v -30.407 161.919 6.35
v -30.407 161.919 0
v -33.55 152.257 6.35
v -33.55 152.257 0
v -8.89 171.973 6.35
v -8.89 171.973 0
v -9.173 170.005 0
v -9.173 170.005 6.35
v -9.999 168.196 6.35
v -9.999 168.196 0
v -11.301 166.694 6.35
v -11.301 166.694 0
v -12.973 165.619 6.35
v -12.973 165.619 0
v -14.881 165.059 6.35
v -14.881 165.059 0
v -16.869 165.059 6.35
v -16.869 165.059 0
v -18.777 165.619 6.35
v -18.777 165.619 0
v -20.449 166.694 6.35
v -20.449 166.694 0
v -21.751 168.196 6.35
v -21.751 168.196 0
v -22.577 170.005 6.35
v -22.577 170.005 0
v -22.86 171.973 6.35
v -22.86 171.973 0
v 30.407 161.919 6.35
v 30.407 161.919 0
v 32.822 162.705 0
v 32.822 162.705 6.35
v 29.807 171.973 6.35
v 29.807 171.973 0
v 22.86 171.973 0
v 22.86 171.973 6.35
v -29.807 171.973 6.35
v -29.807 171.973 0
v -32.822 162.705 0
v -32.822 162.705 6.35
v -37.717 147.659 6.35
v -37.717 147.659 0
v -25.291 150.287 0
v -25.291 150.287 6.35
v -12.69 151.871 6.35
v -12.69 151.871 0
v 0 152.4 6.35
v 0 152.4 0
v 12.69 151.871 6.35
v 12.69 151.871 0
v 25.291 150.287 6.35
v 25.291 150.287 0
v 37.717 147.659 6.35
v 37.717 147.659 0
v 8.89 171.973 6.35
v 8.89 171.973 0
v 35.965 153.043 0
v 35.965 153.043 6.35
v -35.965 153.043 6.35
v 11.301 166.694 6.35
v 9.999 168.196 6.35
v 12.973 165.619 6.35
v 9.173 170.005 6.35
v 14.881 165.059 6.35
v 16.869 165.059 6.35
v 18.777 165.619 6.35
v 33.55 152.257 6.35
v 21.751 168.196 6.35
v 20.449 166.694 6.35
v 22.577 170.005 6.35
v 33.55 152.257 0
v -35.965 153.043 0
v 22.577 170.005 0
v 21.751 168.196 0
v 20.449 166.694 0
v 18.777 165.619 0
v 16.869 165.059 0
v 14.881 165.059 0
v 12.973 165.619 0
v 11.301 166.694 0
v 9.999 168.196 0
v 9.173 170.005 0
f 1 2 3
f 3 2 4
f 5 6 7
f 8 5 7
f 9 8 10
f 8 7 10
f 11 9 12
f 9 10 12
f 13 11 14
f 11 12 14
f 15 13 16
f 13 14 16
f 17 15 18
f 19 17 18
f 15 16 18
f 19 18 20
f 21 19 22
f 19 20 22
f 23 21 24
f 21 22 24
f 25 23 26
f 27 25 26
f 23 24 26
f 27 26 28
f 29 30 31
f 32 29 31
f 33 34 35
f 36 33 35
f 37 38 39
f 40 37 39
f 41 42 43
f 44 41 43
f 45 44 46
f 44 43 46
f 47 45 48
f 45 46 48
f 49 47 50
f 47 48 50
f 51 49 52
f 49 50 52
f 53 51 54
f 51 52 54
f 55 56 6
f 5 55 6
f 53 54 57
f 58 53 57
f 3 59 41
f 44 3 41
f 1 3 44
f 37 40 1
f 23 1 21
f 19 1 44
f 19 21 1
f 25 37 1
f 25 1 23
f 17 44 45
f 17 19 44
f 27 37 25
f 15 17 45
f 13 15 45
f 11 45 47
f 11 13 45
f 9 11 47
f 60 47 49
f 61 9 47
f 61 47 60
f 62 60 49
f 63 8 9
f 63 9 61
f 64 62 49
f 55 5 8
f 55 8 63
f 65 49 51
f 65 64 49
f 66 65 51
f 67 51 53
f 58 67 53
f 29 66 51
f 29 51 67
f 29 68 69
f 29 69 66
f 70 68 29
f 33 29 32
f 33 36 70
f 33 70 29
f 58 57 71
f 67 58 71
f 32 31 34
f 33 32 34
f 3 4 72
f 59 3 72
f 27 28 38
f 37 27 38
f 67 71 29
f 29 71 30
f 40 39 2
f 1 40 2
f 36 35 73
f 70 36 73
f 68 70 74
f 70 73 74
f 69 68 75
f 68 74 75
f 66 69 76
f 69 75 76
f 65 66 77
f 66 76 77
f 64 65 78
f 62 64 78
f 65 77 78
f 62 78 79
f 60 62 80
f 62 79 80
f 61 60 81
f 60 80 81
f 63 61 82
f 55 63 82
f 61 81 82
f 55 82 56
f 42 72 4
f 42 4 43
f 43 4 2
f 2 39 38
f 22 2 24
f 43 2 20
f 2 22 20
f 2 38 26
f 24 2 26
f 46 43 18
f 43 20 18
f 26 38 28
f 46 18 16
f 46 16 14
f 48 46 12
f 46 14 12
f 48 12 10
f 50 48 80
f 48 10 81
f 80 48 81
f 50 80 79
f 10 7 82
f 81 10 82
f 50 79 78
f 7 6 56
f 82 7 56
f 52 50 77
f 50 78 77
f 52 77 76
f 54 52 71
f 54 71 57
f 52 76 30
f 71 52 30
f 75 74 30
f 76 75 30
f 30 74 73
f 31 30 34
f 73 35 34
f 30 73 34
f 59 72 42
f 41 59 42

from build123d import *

# Parameters (mm, degrees)
BOSS_EXTRUDE2_DEPTH = 6.35


with BuildPart() as part:
    # Sketch1 → Boss-Extrude2 (new body)
    with BuildSketch(Plane.XY):
        with BuildLine():
            Line((37.717239544, 147.658964649), (35.965487423, 153.043027332))
            Line((35.965487423, 153.043027332), (33.550115758, 152.257164929))
            Line((33.550115758, 152.257164929), (30.406666146, 161.918651592))
            Line((30.406666146, 161.918651592), (32.822037812, 162.704513995))
            Line((32.822037812, 162.704513995), (29.806543337, 171.972726708))
            Line((29.806543337, 171.972726708), (22.86, 171.972726708))
            ThreePointArc((22.86, 171.972726708), (15.875, 164.987726708), (8.89, 171.972726708))
            Line((8.89, 171.972726708), (-8.89, 171.972726708))
            ThreePointArc((-8.89, 171.972726708), (-15.875, 164.987726708), (-22.86, 171.972726708))
            Line((-22.86, 171.972726708), (-29.806543337, 171.972726708))
            Line((-29.806543337, 171.972726708), (-32.822037812, 162.704513995))
            Line((-32.822037812, 162.704513995), (-30.406666146, 161.918651592))
            Line((-30.406666146, 161.918651592), (-33.550115758, 152.257164929))
            Line((-33.550115758, 152.257164929), (-35.965487423, 153.043027332))
            Line((-35.965487423, 153.043027332), (-37.717239544, 147.658964649))
            ThreePointArc((-37.717239544, 147.658964649), (0, 152.4), (37.717239544, 147.658964649))
        make_face()
    extrude(amount=BOSS_EXTRUDE2_DEPTH)


solid = part.part
